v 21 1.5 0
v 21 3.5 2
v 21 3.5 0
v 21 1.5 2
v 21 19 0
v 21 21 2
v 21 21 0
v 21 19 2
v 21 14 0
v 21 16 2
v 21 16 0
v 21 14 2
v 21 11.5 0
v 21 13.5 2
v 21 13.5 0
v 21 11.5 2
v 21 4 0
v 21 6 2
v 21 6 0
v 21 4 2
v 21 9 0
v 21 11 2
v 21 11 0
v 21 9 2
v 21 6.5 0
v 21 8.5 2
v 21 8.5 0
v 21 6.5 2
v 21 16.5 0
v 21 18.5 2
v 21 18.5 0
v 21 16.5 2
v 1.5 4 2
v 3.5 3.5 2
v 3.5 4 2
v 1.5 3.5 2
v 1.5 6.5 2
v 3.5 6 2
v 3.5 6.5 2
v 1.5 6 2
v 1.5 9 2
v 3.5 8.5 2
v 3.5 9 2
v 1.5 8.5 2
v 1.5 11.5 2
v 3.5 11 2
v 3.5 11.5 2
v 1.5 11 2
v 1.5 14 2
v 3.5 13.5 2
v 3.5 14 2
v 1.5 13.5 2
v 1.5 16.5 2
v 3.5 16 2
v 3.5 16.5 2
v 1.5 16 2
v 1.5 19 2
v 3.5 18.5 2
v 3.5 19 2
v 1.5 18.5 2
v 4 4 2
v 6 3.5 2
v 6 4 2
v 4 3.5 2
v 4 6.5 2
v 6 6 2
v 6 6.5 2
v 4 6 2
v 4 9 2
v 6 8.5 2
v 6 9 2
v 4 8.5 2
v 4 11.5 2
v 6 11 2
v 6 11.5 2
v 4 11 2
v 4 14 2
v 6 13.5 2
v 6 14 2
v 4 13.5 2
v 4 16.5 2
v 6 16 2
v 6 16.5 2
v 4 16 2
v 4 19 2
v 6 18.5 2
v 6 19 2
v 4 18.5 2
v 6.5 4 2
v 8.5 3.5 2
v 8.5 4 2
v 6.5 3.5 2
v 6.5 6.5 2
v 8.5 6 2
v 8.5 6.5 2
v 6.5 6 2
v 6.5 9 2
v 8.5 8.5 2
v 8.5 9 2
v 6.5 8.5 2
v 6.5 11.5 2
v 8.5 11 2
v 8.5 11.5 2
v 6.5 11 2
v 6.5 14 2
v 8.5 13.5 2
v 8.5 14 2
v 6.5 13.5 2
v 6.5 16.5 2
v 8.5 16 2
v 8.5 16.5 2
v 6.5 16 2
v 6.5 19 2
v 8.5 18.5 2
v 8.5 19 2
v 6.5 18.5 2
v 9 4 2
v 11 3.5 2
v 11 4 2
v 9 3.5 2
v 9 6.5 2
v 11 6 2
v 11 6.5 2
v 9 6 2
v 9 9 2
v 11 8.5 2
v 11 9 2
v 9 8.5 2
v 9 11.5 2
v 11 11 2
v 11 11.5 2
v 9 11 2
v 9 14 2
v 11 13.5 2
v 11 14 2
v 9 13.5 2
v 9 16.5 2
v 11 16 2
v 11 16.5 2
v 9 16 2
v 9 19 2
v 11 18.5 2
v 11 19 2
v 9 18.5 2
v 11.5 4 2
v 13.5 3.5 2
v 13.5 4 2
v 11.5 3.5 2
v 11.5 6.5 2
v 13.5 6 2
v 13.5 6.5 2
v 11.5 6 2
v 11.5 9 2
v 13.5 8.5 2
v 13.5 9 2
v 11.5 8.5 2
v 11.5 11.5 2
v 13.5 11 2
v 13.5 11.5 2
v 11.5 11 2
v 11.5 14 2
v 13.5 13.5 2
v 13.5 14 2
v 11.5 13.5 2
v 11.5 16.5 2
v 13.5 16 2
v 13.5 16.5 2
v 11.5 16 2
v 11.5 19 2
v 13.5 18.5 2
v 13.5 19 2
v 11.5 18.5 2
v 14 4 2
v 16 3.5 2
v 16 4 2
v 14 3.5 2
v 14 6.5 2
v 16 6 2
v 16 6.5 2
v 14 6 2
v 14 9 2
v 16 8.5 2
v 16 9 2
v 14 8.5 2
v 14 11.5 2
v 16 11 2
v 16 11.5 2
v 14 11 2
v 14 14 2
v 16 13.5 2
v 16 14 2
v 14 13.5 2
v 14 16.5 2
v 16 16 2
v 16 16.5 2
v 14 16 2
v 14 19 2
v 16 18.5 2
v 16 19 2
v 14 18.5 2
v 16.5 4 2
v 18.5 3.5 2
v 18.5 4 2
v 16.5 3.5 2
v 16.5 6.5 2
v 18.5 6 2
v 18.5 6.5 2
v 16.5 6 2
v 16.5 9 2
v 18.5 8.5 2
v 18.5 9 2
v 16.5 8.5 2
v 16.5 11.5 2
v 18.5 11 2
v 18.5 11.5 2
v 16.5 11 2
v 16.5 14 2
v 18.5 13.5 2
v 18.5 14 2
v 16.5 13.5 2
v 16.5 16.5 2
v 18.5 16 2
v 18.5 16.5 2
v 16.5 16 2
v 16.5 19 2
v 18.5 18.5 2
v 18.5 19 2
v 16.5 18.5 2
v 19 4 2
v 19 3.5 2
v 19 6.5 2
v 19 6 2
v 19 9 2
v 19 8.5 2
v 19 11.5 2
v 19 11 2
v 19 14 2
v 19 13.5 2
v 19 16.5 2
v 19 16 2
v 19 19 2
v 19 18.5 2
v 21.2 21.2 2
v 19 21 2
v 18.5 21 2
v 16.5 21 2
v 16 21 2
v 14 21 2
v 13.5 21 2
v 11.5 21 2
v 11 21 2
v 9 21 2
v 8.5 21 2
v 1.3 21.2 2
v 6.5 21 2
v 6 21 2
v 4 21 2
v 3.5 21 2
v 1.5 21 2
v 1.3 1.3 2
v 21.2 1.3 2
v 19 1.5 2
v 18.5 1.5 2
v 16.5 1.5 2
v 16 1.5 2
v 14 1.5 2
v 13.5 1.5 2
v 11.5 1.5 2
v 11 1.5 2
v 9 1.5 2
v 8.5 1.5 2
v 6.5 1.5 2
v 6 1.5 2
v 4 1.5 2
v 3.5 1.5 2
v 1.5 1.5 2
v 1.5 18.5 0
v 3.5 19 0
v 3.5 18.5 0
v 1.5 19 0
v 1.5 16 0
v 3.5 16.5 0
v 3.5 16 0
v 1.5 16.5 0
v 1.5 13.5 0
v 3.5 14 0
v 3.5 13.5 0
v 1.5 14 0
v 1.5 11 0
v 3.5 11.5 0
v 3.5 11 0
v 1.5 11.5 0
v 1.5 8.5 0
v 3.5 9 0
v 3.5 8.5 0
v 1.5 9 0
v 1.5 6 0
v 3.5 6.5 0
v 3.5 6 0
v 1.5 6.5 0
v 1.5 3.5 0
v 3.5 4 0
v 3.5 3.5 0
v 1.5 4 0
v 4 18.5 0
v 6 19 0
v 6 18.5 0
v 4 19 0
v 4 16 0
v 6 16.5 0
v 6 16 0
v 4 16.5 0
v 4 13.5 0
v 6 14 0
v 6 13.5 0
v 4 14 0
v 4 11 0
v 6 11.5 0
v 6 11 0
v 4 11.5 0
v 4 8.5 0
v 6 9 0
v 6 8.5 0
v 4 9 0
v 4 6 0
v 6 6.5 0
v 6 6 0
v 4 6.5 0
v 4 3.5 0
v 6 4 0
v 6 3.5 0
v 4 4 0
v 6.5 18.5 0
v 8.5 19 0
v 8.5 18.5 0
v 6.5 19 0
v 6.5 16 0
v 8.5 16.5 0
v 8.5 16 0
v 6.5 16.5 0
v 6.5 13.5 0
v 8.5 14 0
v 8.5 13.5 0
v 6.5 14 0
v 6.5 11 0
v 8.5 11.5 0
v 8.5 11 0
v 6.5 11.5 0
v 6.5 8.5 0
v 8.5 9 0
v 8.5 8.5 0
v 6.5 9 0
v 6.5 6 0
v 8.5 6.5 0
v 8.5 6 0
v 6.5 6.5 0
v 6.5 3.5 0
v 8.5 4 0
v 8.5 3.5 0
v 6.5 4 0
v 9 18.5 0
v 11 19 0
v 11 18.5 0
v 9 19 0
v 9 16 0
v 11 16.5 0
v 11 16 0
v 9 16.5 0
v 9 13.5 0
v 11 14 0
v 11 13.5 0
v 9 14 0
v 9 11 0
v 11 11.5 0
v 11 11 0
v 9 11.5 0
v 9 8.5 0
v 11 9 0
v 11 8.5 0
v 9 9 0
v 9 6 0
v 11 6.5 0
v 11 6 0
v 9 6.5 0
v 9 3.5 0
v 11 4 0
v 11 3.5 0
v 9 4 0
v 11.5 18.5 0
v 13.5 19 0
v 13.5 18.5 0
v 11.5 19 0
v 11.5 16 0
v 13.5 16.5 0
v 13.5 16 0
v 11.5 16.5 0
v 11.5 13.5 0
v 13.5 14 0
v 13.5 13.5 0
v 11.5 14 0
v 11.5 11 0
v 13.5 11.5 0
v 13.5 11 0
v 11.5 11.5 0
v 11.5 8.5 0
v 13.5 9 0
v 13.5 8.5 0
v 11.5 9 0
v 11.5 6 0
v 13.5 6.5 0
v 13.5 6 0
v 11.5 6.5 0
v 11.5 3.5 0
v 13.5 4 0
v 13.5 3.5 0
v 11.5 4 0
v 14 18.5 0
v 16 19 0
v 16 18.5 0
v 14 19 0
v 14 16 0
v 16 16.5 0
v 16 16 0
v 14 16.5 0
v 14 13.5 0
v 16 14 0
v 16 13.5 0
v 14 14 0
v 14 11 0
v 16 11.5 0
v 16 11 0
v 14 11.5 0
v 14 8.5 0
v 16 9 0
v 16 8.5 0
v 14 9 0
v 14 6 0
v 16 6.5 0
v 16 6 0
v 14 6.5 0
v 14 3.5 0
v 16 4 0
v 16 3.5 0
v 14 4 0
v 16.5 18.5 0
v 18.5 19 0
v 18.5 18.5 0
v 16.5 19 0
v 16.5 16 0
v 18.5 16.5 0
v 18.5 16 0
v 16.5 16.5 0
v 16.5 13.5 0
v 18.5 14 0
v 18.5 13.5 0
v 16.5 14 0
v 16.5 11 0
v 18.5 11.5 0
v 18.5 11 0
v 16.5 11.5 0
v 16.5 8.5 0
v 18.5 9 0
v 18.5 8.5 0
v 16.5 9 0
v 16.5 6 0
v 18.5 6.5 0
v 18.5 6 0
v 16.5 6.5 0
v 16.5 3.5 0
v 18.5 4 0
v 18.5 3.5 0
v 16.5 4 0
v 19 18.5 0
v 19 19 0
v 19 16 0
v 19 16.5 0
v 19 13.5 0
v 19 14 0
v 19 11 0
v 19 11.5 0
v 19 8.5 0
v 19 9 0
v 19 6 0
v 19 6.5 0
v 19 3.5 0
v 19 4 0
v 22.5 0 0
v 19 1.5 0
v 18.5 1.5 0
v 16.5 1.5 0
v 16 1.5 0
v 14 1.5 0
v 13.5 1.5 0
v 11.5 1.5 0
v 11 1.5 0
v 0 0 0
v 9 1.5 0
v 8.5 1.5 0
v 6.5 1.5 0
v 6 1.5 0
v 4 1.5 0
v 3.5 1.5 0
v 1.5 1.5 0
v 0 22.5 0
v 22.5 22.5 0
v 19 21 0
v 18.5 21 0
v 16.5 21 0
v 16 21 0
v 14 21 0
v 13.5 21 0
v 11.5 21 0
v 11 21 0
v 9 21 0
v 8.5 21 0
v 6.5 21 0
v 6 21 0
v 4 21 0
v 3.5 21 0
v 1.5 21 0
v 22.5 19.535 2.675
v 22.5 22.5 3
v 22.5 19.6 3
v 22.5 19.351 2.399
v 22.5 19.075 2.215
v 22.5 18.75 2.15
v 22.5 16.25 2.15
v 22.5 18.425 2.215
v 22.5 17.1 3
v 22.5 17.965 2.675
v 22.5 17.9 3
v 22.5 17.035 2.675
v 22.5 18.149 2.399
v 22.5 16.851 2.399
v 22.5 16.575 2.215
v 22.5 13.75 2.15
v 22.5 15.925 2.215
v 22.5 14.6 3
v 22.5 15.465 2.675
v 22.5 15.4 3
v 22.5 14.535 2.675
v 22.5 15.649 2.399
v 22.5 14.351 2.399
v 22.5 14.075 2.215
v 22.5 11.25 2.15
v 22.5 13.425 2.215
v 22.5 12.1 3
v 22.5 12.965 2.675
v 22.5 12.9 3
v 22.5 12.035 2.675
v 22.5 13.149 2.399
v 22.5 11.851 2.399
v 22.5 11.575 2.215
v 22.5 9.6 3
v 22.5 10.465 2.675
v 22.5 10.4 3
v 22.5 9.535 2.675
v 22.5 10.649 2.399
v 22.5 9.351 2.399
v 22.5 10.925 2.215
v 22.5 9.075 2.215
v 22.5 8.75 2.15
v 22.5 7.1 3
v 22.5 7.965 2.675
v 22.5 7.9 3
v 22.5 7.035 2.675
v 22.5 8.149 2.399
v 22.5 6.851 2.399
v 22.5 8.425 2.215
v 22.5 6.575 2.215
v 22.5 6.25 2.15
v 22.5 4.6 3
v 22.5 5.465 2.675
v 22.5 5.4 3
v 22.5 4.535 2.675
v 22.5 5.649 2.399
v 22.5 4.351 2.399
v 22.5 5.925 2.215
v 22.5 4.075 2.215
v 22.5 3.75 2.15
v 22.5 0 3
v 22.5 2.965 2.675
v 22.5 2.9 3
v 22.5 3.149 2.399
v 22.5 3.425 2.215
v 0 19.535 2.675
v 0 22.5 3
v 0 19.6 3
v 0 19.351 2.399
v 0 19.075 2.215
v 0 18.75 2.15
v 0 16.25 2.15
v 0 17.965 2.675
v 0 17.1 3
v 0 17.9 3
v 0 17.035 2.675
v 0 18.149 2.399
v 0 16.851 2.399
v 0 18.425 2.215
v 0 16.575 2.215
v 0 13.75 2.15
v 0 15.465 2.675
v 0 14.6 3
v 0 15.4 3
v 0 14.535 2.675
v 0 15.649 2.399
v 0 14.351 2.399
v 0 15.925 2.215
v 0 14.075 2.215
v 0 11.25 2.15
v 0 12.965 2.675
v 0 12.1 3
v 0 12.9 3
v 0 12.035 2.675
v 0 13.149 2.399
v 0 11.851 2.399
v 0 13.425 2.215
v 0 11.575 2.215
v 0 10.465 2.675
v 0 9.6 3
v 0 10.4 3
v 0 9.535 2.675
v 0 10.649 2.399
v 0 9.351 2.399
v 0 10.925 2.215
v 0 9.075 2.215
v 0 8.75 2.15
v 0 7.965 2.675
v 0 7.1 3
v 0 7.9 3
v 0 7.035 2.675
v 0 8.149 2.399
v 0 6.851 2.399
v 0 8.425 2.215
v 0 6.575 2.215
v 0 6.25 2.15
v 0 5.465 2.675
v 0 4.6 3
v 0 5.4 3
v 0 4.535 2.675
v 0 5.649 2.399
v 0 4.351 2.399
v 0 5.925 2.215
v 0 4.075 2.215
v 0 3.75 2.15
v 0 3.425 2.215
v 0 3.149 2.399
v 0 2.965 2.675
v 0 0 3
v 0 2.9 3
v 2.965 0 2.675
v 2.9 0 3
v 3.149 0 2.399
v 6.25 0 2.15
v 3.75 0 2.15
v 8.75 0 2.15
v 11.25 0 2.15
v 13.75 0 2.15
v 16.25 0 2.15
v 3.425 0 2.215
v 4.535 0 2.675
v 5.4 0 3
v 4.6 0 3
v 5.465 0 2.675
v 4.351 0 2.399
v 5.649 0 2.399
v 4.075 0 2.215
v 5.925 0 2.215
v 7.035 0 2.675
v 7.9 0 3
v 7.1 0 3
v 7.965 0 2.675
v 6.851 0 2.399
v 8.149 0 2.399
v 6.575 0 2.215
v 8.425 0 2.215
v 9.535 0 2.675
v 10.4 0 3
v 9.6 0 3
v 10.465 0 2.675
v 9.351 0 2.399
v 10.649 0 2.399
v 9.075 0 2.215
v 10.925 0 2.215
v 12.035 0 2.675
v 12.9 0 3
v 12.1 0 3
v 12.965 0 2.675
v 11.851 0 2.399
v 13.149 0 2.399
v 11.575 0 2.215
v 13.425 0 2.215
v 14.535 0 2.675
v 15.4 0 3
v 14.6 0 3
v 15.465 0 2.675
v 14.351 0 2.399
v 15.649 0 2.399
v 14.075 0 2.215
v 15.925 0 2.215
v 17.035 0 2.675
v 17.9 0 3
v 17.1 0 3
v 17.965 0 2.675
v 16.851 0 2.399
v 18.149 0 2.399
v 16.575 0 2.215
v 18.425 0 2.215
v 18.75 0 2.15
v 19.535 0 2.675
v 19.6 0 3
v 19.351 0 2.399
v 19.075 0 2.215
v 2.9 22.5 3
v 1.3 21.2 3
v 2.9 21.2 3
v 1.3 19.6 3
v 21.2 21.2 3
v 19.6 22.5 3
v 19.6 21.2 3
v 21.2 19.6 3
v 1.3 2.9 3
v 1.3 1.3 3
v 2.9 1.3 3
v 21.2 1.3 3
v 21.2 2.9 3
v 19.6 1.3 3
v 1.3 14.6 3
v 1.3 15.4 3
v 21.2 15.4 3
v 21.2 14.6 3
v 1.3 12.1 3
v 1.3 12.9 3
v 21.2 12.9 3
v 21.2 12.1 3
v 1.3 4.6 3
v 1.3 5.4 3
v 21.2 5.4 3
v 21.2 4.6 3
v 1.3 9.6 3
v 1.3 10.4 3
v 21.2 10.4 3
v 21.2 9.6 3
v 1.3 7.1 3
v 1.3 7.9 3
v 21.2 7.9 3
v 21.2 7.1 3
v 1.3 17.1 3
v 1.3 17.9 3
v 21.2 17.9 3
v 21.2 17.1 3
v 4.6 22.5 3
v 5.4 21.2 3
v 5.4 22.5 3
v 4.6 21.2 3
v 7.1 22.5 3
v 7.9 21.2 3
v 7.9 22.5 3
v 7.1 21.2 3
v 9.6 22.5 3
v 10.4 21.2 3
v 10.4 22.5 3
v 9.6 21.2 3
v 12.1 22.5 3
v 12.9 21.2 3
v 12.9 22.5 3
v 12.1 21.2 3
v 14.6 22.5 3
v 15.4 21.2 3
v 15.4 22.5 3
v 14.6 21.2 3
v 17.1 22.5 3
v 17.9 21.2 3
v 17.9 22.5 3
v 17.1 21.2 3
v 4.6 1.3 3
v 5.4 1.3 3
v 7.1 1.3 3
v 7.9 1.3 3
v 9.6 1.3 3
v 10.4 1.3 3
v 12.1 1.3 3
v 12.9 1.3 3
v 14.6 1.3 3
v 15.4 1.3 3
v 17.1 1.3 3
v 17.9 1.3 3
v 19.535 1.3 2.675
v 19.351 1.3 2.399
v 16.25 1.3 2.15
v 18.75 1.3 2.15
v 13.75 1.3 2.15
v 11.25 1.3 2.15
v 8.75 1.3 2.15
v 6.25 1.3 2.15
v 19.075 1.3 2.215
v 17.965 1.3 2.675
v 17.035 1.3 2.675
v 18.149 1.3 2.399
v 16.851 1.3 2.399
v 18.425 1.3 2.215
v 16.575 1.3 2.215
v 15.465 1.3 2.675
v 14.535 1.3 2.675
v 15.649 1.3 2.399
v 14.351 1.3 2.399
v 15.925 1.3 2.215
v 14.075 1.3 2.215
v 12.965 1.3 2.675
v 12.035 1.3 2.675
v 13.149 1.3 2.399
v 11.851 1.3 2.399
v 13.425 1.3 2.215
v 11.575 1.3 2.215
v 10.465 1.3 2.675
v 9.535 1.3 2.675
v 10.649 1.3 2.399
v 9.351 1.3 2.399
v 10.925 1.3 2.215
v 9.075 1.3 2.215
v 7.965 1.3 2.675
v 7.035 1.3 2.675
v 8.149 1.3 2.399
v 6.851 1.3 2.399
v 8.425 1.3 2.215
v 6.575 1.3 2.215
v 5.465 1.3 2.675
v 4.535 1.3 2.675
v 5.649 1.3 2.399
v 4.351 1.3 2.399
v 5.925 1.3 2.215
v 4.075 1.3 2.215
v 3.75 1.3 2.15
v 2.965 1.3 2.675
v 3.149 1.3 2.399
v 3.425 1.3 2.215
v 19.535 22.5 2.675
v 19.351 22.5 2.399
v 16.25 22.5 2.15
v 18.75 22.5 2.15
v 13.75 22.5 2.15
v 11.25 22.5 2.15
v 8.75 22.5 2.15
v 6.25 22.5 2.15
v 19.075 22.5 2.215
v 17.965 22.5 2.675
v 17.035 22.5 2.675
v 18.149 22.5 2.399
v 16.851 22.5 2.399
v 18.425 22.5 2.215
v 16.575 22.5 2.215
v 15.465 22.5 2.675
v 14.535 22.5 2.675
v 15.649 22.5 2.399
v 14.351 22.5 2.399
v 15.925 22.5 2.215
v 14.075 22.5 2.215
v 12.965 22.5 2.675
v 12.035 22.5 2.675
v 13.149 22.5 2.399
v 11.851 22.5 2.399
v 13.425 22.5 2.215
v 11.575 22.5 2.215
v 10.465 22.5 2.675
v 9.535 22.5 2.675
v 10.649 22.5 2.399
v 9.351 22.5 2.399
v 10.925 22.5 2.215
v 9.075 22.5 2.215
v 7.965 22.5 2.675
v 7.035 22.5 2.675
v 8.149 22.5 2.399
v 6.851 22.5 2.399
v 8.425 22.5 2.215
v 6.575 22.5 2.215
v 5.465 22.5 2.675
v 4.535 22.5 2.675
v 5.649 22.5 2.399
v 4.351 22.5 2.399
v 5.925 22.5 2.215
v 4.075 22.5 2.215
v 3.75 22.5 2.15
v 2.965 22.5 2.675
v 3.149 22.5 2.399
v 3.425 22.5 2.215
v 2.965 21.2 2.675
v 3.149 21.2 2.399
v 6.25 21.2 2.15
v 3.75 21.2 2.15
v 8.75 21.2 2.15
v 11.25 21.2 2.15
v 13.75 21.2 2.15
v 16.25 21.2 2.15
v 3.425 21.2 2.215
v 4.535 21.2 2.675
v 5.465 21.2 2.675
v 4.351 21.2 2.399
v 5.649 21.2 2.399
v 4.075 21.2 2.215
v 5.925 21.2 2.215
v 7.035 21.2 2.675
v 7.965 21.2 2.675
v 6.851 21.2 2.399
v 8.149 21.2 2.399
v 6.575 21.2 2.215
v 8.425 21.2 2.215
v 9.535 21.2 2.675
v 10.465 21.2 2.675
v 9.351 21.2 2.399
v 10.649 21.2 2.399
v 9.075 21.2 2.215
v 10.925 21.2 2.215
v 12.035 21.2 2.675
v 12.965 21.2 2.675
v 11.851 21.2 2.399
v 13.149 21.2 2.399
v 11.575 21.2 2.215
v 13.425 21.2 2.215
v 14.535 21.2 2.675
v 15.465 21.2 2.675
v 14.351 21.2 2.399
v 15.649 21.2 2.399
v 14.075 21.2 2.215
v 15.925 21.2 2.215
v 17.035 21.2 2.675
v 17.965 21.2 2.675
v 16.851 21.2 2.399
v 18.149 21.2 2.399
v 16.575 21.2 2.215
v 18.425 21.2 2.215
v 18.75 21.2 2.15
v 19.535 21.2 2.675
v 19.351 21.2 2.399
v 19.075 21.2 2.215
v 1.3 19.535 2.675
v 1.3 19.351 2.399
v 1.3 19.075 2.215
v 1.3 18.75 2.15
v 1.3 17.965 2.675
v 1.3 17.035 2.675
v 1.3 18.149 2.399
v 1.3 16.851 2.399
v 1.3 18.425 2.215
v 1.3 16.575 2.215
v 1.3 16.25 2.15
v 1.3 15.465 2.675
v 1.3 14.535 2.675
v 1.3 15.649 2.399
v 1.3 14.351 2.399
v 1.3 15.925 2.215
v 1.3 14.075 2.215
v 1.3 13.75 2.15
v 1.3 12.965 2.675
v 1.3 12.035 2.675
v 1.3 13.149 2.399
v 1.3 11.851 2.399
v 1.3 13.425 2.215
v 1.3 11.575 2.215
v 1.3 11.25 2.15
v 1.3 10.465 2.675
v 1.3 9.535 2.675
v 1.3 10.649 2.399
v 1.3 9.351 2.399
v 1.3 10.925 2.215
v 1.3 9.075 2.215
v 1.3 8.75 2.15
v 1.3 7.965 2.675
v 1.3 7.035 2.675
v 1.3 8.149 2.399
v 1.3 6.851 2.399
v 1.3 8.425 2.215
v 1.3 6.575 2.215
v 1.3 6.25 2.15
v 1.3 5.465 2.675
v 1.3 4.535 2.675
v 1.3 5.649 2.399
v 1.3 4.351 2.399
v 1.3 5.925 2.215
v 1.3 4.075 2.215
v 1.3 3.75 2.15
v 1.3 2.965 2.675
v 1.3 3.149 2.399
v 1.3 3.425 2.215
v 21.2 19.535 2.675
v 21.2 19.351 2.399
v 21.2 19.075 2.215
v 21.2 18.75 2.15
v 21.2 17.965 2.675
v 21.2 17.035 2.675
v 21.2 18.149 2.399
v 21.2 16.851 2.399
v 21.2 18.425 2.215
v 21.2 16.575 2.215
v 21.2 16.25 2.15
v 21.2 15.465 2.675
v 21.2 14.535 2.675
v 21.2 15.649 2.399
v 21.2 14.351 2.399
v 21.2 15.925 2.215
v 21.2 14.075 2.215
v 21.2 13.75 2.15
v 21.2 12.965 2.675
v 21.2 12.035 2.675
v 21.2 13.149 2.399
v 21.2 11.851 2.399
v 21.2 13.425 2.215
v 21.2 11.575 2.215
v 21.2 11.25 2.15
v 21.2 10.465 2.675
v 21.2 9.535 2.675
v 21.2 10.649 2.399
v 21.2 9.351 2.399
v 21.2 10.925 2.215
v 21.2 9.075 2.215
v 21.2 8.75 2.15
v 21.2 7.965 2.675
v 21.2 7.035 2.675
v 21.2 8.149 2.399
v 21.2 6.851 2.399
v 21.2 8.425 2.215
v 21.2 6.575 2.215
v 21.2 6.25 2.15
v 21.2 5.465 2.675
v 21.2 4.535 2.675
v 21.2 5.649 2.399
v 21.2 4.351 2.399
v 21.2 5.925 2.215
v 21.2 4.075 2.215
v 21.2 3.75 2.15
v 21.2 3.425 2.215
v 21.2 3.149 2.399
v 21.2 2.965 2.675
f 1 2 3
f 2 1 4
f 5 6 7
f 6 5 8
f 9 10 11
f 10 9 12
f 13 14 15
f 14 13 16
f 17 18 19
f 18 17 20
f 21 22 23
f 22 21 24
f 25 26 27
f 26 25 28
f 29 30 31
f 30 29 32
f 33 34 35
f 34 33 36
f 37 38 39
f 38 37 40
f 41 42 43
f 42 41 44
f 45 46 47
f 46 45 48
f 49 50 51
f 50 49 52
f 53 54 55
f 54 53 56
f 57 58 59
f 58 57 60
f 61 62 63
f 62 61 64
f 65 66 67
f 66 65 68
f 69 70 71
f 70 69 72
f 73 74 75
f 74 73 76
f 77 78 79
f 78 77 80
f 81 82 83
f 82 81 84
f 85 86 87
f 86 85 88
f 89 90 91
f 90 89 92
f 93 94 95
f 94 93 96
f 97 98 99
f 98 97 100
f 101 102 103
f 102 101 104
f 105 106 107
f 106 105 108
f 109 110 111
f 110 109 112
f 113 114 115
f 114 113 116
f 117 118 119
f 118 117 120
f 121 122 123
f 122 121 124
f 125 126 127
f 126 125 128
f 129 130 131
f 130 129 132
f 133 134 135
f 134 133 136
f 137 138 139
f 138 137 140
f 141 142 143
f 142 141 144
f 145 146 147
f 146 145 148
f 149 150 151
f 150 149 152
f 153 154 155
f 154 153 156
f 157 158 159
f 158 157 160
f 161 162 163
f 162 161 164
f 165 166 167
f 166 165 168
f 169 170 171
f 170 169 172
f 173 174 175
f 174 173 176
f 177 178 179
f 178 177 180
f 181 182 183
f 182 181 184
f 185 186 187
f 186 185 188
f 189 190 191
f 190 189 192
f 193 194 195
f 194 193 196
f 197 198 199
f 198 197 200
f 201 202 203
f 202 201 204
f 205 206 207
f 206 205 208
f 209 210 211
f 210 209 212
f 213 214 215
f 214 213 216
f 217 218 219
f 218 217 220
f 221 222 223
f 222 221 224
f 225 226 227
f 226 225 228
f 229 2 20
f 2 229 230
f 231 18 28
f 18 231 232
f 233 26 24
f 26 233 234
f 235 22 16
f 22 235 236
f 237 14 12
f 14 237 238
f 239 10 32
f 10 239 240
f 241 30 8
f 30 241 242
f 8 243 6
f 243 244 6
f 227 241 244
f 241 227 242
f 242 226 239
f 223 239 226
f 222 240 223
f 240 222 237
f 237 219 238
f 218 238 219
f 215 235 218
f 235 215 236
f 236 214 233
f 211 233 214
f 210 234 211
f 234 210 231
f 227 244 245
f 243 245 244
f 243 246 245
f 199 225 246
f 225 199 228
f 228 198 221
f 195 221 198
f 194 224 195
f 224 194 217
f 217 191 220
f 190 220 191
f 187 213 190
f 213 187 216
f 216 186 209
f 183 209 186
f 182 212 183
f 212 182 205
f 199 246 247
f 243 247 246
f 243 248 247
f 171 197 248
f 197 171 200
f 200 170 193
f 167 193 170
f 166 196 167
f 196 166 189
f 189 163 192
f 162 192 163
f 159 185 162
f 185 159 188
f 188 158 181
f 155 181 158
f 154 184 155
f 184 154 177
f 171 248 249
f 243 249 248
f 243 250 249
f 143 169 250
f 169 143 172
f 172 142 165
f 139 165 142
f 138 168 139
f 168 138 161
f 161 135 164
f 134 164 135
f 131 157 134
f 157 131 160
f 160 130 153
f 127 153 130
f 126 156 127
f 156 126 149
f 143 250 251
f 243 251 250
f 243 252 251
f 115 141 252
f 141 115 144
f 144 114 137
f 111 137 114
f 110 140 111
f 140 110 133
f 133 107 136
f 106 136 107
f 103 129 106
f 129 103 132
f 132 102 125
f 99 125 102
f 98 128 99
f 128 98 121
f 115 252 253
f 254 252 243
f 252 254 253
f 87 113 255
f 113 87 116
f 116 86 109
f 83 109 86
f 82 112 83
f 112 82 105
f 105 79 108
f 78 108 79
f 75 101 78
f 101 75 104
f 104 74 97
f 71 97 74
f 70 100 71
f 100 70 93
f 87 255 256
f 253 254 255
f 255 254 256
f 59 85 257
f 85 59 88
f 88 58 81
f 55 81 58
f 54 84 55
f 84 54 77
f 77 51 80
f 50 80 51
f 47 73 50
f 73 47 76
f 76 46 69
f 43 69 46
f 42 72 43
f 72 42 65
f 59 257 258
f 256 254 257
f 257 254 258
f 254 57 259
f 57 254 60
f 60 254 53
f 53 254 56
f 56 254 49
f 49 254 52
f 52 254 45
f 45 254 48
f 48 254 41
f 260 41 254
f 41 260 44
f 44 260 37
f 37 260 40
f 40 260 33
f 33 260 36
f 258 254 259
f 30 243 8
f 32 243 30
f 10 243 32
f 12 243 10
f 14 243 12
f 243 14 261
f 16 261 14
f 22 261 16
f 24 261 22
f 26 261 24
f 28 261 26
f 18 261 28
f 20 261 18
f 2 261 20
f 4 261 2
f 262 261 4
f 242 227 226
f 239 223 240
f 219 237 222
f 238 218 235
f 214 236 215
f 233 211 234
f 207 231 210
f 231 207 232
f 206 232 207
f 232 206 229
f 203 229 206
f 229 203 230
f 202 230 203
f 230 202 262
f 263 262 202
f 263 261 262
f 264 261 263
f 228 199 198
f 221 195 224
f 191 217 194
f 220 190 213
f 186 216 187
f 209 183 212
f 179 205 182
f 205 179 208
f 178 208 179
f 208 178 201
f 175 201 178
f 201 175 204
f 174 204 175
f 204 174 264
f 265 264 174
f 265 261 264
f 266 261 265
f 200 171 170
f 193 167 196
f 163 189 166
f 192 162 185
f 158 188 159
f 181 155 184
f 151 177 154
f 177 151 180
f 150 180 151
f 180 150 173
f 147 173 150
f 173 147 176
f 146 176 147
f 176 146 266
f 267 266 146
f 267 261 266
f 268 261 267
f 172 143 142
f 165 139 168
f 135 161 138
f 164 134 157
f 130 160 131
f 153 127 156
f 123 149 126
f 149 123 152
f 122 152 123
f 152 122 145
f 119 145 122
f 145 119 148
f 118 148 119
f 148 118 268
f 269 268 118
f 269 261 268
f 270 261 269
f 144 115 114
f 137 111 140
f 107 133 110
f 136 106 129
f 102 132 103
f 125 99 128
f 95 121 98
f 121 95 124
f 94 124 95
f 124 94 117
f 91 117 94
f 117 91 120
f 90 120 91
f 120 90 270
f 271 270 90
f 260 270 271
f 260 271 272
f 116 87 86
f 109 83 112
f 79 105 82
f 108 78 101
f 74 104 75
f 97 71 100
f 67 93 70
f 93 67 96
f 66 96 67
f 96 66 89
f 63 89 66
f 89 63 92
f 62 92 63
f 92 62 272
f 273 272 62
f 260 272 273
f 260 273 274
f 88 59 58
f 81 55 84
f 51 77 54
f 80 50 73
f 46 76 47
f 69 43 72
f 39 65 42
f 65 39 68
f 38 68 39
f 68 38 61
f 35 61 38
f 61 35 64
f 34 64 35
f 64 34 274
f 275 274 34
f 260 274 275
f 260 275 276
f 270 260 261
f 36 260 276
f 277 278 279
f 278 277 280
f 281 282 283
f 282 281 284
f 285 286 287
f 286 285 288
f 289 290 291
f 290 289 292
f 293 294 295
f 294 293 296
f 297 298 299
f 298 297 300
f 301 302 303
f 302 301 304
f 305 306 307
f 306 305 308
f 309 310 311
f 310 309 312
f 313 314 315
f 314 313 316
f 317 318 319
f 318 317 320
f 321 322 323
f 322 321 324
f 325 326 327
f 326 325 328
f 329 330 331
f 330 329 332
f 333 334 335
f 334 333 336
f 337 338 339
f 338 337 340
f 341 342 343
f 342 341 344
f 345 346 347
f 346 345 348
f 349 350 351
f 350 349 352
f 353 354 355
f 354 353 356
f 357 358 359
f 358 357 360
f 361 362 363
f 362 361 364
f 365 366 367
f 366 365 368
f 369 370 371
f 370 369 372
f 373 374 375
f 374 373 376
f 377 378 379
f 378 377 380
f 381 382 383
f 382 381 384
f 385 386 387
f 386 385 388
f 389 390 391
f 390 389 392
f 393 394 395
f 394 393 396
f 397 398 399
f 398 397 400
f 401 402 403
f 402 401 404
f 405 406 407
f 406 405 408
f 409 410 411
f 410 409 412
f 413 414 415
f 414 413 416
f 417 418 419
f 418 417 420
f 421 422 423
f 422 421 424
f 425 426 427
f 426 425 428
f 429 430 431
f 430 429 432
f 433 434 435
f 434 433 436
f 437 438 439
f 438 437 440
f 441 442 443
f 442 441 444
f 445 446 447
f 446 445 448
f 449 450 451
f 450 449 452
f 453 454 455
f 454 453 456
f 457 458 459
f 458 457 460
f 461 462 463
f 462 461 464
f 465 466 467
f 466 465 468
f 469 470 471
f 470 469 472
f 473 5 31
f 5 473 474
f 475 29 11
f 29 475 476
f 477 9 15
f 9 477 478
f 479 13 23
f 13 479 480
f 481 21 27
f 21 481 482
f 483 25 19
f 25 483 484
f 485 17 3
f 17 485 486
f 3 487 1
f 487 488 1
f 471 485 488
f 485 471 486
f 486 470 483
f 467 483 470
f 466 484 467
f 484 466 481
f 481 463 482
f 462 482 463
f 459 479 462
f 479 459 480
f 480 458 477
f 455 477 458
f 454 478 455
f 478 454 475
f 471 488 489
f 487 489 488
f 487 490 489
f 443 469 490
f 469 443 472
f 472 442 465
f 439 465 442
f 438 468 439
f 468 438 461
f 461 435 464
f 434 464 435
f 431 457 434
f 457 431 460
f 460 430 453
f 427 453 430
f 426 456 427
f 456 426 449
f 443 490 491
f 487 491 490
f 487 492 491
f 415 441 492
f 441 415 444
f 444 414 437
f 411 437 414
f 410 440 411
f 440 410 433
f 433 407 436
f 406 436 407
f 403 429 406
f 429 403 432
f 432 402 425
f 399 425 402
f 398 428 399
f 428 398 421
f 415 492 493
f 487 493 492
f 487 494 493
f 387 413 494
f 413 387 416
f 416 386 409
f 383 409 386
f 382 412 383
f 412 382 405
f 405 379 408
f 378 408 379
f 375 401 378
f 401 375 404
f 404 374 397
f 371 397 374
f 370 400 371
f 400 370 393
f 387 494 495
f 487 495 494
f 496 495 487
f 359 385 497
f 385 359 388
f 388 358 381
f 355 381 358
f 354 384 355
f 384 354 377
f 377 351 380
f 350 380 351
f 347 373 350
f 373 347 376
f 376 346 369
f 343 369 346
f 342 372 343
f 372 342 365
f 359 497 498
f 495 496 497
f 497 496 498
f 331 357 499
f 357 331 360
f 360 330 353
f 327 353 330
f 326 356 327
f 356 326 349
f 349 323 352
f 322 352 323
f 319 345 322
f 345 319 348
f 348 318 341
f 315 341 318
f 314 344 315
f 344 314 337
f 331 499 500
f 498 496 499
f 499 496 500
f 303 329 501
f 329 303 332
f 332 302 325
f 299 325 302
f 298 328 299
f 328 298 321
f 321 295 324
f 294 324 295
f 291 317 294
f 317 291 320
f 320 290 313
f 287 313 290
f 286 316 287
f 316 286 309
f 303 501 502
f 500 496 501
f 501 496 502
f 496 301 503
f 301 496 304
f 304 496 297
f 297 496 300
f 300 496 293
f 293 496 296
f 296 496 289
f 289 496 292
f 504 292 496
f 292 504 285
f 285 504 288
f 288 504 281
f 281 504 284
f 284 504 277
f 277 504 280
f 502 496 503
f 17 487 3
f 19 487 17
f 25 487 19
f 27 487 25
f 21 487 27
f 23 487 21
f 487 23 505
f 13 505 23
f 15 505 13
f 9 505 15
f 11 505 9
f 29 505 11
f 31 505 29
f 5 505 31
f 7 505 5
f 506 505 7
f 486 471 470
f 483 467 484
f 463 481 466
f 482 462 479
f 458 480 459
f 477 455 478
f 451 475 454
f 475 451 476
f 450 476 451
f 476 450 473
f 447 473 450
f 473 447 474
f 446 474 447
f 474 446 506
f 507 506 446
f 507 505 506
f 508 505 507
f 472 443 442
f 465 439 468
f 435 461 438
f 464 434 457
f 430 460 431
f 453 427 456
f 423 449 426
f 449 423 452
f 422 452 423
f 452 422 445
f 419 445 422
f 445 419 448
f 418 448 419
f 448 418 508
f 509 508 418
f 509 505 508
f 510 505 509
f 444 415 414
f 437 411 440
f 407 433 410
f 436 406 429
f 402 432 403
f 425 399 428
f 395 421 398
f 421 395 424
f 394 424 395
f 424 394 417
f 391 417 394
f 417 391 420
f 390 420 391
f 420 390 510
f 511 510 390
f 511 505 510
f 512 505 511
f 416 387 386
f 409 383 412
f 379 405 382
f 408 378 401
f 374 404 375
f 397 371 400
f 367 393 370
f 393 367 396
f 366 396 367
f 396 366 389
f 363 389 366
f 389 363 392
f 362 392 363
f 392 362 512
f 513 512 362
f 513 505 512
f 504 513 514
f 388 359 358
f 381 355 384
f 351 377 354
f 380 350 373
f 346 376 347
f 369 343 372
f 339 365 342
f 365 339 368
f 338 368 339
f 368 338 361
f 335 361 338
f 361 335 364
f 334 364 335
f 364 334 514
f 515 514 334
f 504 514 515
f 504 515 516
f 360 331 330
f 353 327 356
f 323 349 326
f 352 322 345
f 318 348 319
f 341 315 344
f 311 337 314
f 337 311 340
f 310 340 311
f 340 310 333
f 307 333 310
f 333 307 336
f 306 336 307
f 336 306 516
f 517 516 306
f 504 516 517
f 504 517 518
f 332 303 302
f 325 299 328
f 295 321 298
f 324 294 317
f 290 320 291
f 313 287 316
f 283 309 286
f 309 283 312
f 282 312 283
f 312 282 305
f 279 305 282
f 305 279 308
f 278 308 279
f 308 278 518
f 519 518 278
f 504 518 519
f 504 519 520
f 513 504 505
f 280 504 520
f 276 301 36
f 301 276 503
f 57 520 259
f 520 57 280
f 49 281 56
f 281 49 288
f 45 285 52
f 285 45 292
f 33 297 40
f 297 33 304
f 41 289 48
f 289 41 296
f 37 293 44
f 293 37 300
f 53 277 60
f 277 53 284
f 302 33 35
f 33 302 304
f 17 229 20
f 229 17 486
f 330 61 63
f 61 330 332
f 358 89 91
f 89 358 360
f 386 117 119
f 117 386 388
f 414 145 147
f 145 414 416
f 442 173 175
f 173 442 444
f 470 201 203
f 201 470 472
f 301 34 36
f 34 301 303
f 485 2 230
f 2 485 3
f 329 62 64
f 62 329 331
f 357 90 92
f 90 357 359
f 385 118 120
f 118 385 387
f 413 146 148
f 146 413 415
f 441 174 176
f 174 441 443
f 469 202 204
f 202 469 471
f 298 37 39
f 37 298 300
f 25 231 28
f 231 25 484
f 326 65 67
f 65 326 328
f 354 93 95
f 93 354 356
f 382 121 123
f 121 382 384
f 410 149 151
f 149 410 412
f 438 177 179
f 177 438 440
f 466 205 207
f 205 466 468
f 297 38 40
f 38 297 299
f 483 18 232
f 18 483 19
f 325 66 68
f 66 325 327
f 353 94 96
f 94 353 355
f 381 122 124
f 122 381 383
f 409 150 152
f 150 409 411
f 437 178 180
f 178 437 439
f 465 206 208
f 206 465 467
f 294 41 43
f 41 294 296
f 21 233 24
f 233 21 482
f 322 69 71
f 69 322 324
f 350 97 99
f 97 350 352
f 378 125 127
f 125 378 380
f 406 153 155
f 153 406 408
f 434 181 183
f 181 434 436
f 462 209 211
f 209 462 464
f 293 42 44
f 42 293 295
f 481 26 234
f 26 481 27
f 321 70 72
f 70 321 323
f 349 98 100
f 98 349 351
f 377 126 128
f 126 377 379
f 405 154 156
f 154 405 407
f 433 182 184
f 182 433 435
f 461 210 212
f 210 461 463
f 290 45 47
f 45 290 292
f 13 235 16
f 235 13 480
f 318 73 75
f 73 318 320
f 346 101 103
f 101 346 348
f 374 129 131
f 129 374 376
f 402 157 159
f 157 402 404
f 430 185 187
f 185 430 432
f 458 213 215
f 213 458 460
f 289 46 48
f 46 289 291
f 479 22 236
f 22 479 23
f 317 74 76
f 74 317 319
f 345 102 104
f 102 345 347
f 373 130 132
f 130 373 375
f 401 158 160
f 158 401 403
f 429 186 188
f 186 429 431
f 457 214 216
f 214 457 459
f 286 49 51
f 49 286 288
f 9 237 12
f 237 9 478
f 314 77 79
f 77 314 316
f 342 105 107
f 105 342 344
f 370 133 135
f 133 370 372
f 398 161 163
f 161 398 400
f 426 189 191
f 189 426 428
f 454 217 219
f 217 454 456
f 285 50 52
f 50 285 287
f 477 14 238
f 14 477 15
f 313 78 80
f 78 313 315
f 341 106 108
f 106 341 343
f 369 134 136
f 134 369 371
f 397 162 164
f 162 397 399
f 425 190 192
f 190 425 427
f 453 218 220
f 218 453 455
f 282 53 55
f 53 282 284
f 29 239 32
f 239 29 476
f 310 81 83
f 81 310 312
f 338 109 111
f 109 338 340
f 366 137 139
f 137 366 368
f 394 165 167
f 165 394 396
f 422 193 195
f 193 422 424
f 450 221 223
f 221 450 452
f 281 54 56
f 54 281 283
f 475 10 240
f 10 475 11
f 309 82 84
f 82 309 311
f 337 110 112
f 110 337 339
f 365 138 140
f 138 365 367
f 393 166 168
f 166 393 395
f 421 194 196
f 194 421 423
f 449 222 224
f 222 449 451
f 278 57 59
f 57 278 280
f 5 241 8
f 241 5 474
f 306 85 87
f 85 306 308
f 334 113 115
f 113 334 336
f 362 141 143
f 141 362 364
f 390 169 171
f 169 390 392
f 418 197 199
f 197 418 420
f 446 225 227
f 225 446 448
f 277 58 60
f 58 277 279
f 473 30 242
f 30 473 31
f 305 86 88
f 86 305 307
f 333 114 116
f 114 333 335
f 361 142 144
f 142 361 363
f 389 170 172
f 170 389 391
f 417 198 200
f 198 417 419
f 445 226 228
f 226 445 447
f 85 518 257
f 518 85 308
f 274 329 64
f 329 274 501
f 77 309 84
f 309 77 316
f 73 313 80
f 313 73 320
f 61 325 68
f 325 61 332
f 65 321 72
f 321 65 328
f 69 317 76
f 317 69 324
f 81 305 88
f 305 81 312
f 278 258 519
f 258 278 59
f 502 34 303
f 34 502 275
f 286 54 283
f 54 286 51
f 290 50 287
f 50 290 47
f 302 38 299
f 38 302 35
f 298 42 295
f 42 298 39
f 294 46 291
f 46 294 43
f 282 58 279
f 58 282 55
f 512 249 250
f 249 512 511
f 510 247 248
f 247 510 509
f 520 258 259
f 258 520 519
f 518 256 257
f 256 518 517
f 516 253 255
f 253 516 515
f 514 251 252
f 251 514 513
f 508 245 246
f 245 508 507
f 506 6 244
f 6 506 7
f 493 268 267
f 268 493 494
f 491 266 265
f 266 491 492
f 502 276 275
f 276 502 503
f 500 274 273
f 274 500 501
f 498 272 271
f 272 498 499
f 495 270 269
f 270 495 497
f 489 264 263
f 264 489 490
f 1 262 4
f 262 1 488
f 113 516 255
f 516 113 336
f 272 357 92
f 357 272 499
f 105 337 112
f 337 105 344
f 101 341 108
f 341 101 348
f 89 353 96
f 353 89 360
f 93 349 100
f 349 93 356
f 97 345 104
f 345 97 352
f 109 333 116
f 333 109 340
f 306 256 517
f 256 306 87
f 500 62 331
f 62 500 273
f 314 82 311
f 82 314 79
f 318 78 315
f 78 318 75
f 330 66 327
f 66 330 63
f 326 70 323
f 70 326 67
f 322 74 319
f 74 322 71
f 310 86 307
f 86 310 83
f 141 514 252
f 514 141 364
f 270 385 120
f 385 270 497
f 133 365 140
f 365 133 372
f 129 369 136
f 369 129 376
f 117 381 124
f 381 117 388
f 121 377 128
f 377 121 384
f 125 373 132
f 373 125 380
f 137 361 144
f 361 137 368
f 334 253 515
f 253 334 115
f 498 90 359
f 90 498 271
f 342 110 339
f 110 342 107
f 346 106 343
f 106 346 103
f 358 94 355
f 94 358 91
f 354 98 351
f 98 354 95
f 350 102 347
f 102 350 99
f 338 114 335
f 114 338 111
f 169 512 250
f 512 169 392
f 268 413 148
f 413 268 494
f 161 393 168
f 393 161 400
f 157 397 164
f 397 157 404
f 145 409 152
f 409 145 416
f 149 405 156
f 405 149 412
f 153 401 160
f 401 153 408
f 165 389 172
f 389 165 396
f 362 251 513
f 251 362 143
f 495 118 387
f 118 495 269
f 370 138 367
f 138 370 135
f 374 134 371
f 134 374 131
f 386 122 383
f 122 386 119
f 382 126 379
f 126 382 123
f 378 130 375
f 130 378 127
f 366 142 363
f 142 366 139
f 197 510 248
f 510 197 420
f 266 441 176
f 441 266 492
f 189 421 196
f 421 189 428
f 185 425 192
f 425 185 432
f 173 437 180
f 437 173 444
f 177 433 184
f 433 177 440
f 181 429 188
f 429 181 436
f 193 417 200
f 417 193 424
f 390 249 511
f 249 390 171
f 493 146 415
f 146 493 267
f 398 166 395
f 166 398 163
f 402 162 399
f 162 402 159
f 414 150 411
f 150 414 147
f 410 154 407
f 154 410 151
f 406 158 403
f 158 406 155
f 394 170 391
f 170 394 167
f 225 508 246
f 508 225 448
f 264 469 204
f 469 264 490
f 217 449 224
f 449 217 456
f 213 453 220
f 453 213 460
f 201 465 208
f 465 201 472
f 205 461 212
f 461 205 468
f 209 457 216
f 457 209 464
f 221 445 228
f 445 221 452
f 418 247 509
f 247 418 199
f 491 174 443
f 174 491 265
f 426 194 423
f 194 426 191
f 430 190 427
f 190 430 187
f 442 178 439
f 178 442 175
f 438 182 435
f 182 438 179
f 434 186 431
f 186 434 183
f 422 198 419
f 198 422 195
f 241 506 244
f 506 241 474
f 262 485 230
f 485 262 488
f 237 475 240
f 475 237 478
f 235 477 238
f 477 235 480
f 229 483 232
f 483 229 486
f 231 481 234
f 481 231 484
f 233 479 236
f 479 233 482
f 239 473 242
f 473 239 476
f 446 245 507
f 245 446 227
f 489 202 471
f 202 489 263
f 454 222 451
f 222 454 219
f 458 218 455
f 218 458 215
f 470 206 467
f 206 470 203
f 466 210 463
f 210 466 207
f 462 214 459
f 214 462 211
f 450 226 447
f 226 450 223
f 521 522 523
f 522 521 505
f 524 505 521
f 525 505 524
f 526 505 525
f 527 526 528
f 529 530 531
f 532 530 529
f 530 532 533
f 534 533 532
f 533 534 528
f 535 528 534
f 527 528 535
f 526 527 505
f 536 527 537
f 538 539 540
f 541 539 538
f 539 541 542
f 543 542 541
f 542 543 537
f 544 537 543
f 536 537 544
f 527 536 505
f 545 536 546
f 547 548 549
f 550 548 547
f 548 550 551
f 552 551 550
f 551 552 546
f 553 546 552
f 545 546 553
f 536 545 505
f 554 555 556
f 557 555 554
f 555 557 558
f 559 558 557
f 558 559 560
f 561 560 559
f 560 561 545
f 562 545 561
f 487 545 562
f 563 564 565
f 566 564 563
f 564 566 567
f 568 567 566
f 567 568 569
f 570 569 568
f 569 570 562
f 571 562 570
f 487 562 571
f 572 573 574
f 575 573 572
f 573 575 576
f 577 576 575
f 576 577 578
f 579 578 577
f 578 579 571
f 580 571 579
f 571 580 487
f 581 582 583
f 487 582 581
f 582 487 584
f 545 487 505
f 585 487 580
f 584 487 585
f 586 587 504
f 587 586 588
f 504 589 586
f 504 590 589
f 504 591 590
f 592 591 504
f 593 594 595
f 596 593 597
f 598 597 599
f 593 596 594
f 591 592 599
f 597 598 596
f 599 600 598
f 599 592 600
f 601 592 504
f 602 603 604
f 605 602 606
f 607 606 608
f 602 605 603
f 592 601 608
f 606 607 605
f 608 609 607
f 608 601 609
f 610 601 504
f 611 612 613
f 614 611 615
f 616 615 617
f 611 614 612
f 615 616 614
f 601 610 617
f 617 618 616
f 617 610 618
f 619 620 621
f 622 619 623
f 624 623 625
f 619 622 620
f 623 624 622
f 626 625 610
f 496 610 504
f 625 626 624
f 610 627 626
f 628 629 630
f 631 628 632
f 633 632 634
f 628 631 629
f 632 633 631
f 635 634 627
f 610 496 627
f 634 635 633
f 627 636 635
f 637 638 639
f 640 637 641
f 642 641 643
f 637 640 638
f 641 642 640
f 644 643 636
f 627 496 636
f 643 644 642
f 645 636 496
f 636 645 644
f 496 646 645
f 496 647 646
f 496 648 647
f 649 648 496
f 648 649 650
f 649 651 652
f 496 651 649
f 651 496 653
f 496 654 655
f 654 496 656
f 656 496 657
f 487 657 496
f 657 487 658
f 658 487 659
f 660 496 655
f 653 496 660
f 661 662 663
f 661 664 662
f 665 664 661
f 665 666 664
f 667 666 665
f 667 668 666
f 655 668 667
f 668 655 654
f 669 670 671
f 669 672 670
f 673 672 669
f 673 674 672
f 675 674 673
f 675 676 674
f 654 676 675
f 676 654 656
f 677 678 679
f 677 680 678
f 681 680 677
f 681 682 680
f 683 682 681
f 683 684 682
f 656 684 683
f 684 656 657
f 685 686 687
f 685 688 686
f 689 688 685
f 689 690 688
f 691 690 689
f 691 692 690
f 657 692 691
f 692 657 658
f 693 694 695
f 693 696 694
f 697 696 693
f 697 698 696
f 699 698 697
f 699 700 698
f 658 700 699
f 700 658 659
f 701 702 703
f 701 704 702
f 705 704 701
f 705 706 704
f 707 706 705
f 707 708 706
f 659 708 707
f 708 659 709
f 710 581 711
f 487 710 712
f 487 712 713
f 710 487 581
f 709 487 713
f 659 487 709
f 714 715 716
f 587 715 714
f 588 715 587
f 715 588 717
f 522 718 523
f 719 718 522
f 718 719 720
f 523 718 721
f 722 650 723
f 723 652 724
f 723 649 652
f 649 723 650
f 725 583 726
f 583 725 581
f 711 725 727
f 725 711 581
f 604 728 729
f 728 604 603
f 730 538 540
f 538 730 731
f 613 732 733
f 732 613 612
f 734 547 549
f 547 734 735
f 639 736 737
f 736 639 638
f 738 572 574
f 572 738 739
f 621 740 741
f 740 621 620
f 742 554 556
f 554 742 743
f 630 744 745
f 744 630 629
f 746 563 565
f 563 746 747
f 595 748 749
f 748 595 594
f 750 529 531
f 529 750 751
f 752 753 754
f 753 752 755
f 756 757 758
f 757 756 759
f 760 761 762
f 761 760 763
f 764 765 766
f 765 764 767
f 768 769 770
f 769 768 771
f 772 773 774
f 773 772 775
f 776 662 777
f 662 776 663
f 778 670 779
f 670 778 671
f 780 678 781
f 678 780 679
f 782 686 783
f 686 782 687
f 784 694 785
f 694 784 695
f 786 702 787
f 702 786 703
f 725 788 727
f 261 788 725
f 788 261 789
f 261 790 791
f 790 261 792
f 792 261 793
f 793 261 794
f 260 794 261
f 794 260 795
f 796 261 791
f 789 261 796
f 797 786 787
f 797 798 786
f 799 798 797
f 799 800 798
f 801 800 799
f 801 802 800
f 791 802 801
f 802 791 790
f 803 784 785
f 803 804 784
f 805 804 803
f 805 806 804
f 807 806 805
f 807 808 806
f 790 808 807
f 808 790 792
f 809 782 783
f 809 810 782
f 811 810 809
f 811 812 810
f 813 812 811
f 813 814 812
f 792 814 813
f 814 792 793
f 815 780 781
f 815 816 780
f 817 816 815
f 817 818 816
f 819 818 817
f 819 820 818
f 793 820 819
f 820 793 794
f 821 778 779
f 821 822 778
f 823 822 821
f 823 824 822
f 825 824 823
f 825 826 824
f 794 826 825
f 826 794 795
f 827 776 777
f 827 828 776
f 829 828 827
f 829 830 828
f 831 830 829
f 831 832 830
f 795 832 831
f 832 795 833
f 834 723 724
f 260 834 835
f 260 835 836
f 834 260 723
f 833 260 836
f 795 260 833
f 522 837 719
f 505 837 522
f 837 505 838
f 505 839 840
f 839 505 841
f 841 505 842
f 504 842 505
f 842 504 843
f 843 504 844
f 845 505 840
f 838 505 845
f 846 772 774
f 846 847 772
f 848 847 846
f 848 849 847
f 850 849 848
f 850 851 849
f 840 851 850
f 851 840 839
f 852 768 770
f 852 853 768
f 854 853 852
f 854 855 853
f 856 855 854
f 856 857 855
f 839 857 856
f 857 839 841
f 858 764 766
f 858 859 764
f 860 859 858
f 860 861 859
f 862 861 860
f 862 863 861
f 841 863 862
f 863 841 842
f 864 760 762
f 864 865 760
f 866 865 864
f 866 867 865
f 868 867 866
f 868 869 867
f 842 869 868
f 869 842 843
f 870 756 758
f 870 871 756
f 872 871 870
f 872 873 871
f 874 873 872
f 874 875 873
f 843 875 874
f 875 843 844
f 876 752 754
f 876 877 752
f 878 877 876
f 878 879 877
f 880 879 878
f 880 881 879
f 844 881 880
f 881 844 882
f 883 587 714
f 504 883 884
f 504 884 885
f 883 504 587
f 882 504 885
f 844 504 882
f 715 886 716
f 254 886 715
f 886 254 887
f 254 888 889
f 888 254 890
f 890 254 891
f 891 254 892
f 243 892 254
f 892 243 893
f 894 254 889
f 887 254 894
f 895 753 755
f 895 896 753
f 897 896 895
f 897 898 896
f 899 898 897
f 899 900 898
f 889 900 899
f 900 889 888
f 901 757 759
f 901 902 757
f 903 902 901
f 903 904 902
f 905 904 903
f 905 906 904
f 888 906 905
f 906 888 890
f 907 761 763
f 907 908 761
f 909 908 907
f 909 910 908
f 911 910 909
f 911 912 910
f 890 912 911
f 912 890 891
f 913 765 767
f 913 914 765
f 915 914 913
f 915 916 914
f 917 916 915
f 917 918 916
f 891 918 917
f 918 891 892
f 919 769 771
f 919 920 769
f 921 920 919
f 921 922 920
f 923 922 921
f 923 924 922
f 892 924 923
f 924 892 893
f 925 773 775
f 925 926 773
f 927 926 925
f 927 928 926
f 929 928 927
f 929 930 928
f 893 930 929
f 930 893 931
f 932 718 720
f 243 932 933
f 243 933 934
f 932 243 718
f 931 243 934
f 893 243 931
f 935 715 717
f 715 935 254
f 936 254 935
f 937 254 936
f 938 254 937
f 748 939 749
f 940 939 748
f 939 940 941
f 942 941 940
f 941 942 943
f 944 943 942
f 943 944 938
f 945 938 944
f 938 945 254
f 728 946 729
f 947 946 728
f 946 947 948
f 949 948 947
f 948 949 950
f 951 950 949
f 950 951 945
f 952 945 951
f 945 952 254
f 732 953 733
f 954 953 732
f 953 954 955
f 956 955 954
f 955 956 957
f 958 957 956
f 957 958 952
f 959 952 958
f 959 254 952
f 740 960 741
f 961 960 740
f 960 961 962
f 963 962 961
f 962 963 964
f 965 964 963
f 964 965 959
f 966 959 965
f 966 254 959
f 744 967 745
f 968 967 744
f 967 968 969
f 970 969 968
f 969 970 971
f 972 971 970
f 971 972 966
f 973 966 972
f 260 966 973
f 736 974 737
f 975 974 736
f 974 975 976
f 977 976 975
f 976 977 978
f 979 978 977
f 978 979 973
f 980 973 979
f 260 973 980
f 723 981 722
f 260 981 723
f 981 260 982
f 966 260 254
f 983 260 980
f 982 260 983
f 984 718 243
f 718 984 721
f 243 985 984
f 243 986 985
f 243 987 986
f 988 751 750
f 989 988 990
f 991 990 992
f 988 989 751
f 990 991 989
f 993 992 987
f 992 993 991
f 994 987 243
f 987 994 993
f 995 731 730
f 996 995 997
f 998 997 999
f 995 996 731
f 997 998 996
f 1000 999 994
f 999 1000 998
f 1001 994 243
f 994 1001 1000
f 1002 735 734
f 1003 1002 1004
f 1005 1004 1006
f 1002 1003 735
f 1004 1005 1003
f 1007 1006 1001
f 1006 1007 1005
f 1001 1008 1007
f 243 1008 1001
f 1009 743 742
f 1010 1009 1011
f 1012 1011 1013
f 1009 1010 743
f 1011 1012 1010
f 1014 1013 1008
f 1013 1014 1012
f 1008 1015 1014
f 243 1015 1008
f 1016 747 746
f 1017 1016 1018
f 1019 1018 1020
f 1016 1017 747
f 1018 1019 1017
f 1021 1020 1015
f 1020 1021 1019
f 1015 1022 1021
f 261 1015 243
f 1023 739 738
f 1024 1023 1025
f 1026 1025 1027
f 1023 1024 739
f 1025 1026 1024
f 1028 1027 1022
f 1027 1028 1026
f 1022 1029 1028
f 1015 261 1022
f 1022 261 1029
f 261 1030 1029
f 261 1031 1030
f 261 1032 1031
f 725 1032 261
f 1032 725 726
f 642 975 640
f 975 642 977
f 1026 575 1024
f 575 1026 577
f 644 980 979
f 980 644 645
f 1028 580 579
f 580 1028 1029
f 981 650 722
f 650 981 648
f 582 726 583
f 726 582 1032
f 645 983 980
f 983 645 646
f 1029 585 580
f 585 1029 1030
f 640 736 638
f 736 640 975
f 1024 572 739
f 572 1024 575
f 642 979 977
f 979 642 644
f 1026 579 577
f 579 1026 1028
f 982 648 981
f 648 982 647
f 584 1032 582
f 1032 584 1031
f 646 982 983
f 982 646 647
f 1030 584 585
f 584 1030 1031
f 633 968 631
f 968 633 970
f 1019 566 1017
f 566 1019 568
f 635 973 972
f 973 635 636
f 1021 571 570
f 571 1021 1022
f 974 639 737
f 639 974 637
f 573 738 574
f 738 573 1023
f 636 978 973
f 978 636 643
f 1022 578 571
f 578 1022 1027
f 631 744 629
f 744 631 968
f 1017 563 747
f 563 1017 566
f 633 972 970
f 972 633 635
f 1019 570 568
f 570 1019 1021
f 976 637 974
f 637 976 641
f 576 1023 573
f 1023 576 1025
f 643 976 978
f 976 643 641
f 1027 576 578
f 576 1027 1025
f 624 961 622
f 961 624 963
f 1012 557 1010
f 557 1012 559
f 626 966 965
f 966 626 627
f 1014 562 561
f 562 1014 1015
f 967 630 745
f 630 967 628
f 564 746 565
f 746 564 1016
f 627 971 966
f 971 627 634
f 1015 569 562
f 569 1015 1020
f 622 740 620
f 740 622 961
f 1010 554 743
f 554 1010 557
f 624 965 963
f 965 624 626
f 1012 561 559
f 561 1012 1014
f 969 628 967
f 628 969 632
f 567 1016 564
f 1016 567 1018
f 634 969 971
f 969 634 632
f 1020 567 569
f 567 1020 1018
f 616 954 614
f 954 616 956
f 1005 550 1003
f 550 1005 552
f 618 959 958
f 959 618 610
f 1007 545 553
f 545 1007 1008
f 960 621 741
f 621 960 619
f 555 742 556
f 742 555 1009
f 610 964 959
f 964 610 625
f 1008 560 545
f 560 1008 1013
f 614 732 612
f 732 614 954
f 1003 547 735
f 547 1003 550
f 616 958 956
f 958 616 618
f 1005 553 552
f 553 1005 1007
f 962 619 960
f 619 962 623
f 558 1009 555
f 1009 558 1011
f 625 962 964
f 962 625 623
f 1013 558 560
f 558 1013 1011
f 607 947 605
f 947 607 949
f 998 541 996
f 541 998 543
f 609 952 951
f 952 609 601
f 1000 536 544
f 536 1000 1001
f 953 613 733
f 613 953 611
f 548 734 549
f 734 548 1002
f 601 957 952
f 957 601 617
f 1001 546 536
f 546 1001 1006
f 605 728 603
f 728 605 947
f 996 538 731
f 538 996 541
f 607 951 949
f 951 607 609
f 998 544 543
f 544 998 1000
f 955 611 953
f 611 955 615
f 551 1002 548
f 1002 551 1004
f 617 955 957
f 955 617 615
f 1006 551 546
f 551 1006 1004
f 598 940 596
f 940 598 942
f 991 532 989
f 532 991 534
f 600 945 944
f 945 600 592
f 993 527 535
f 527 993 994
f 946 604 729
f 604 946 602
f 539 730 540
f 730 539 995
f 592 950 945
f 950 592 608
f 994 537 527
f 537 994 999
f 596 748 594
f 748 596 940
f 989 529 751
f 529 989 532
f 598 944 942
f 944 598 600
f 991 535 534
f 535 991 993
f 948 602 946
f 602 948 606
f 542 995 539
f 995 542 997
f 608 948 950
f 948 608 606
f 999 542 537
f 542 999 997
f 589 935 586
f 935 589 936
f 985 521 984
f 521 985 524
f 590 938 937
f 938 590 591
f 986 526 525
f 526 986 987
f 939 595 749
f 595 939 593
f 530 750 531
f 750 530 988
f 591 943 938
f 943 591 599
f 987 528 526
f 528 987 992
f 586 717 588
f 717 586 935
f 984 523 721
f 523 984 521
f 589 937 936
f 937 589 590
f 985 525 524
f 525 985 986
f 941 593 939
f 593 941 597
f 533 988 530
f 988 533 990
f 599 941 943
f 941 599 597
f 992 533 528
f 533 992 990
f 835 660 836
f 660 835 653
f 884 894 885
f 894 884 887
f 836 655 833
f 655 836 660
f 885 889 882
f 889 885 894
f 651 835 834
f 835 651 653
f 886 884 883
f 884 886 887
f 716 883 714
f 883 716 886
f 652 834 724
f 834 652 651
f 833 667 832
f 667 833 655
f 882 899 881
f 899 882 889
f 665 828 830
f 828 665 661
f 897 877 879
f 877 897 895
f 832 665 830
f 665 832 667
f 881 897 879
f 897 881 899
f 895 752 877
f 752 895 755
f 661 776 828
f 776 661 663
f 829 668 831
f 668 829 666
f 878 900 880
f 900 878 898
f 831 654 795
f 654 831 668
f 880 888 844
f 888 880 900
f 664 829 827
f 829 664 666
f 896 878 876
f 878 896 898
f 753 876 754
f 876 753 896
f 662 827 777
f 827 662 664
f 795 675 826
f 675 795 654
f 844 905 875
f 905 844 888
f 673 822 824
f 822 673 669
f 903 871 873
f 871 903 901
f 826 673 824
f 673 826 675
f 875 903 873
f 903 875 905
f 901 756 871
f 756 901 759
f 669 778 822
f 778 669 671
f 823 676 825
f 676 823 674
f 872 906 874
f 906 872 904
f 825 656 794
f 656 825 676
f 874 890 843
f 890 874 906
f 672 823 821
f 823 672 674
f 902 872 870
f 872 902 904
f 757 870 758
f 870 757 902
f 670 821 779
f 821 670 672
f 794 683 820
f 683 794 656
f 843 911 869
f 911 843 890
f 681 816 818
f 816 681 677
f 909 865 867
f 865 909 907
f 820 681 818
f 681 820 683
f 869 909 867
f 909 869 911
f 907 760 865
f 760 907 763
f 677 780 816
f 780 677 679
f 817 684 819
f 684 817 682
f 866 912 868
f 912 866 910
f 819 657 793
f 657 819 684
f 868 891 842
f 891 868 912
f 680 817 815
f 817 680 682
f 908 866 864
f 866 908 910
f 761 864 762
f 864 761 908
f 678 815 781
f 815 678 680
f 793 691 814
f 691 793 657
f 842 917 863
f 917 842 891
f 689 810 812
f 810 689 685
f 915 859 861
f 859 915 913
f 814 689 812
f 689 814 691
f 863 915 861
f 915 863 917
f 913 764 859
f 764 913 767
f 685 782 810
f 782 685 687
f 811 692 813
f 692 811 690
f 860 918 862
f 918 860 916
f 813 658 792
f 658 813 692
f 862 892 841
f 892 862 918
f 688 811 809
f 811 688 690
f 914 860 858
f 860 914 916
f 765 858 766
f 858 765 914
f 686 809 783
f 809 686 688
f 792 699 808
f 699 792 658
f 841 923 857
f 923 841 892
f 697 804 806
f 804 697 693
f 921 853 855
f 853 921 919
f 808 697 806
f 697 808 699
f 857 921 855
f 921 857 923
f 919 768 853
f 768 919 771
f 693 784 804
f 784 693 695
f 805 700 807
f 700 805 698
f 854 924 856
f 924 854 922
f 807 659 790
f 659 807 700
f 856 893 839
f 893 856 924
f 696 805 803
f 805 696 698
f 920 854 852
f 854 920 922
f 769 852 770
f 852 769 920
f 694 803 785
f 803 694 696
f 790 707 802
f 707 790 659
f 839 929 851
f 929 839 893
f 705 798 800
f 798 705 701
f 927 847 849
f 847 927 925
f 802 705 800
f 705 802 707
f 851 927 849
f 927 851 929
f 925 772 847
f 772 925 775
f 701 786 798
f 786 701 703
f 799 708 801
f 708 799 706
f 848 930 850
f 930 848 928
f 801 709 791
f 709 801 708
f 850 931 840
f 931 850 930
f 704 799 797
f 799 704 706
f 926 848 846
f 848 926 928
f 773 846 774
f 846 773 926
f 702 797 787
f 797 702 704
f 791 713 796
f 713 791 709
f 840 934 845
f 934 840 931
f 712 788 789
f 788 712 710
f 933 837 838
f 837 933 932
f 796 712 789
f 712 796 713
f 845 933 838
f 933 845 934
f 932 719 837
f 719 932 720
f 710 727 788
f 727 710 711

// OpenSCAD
grid_size_x = 8; // number of pixels on x
grid_size_y = 8; // number of pixels on y

cell_size = 2.5; // pitch between pixels
inner_wall_thickness = 0.5; // I think you get this one
outer_wall_thickness = 1.5; //this one too
inner_wall_height = 2; // minimum TBD by experimentation
outer_wall_height = inner_wall_height + 1;
pcb_tolerance = 0.2; //wiggle room for pcb

hole_size = 0.85; // size for solder joint holes

module grid() { // make readable code they said... 
  
    translate([0, 0, 0])
            cube([grid_size_y * cell_size - inner_wall_thickness + 2 * outer_wall_thickness, outer_wall_thickness, inner_wall_height]);
    translate([0, 0, inner_wall_height])
            cube([grid_size_y * cell_size - inner_wall_thickness + 2 * outer_wall_thickness, outer_wall_thickness - pcb_tolerance, outer_wall_height - inner_wall_height]);
    
    for (y = [1 : 1 : grid_size_x -1]) {
        translate([outer_wall_thickness, y * cell_size + outer_wall_thickness - inner_wall_thickness, 0])
            cube([grid_size_y * cell_size - inner_wall_thickness, inner_wall_thickness, inner_wall_height]);
    }
    
    translate([0, grid_size_x * cell_size + outer_wall_thickness - inner_wall_thickness, 0])
            cube([grid_size_y * cell_size - inner_wall_thickness + 2 * outer_wall_thickness, outer_wall_thickness, inner_wall_height]);
    translate([0, grid_size_x * cell_size + outer_wall_thickness - inner_wall_thickness + pcb_tolerance, inner_wall_height])
           cube([grid_size_y * cell_size - inner_wall_thickness + 2 * outer_wall_thickness, outer_wall_thickness - pcb_tolerance, outer_wall_height - inner_wall_height]);
    
    
    translate([0, 0, 0])
            cube([outer_wall_thickness, grid_size_x * cell_size - inner_wall_thickness + 2 * outer_wall_thickness, inner_wall_height]); 
    translate([0, 0, inner_wall_height])
            cube([outer_wall_thickness - pcb_tolerance, grid_size_x * cell_size - inner_wall_thickness + 2 * outer_wall_thickness, outer_wall_height - inner_wall_height]);
    
    for (x = [1 : 1 : grid_size_y - 1]) {
        translate([x * cell_size + outer_wall_thickness -inner_wall_thickness, outer_wall_thickness, 0])
            cube([inner_wall_thickness, grid_size_x * cell_size - inner_wall_thickness, inner_wall_height]);
    }
    
    translate([grid_size_y * cell_size + outer_wall_thickness - inner_wall_thickness, 0, 0])
            cube([outer_wall_thickness, grid_size_x * cell_size - inner_wall_thickness + 2 * outer_wall_thickness, inner_wall_height]);
    translate([grid_size_y * cell_size + outer_wall_thickness - inner_wall_thickness + pcb_tolerance, 0, inner_wall_height])
            cube([outer_wall_thickness - pcb_tolerance, grid_size_x * cell_size - inner_wall_thickness + 2 * outer_wall_thickness, outer_wall_height - inner_wall_height]);
}

 
 color([0.9,0.8,1]) difference() { //holes for soldering the module on a different pcb
     grid();
     for (y = [1 : 1 : grid_size_x -1]) {
        translate([-0.1, y * cell_size + outer_wall_thickness - inner_wall_thickness/2, outer_wall_height])
        rotate([0,90,0])
        cylinder(r=hole_size, h=cell_size * (grid_size_y + 2), $fn=16);
    }
    for (y = [1 : 1 : grid_size_y -1]) {
        translate([y * cell_size + outer_wall_thickness - inner_wall_thickness/2, -0.1, outer_wall_height])
        rotate([0,90,90])
        cylinder(r=hole_size, h=cell_size * (grid_size_y + 2), $fn=16);
    }
     
}
